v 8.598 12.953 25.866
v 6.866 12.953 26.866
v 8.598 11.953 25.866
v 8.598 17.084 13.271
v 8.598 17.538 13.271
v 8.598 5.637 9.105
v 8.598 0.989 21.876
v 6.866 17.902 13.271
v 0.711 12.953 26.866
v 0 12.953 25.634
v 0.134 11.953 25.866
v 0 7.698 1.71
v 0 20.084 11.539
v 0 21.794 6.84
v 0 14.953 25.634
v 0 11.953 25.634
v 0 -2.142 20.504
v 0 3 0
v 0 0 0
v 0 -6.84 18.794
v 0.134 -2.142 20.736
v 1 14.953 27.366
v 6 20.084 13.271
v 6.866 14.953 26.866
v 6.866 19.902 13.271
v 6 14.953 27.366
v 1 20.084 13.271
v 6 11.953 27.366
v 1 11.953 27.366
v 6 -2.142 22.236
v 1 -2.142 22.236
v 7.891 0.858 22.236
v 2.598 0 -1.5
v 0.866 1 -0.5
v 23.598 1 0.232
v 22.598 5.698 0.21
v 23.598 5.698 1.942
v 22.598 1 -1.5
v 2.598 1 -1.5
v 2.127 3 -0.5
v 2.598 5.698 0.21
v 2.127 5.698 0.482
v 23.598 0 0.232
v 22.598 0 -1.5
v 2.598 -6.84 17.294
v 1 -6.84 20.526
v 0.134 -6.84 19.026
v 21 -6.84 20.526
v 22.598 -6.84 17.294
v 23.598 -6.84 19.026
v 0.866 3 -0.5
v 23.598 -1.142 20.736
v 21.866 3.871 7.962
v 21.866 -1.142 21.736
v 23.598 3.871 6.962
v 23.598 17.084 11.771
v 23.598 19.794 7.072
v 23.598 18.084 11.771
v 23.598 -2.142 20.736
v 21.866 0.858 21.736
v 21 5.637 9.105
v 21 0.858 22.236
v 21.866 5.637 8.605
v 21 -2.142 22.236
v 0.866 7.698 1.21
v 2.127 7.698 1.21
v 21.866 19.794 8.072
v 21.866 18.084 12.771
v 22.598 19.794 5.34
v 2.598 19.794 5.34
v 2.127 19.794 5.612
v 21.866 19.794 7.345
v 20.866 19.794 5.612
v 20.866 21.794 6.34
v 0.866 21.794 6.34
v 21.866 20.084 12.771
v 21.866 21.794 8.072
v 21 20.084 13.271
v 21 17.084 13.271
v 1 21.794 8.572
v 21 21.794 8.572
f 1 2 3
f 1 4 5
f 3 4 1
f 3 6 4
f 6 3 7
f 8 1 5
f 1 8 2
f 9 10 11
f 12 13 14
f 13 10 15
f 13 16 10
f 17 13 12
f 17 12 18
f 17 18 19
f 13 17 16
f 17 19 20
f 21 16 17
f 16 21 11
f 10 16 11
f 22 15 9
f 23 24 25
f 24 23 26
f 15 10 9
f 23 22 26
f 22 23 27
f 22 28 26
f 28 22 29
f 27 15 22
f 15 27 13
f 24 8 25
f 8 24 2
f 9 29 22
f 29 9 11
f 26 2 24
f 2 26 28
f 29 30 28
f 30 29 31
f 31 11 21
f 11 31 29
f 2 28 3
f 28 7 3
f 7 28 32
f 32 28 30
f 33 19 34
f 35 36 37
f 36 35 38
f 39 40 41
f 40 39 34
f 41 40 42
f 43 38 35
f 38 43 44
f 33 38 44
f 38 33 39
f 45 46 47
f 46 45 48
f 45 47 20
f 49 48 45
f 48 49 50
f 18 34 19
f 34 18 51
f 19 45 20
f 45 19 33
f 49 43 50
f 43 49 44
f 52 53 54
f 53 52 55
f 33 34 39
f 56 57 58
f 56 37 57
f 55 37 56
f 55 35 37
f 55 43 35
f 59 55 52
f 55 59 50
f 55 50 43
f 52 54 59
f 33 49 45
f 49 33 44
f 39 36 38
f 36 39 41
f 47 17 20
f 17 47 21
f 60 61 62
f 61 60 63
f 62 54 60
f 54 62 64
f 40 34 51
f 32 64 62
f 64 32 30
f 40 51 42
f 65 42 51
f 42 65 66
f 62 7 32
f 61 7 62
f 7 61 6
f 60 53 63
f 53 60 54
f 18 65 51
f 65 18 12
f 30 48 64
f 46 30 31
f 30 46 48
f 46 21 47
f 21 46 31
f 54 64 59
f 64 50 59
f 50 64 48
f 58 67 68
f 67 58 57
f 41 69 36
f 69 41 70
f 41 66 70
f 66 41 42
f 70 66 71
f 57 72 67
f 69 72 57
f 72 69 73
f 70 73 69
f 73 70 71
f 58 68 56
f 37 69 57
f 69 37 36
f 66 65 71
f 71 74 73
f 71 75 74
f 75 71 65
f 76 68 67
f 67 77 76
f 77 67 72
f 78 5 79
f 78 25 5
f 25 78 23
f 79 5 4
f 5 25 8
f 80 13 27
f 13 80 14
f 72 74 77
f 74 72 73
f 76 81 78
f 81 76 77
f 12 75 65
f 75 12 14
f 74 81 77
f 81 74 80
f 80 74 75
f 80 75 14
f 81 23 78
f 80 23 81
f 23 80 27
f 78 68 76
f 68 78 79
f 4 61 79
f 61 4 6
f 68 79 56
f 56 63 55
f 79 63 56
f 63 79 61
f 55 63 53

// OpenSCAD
// case 09: two non-convex solids, neither a prism along a shared direction. Each is split into
// convex prisms along its own direction; every pair is one polytope hull. Exact (manifold's
// mesh sum over the same polyhedra lands on the same volume).
minkowski() { rotate([20, 0, 0]) difference() { cube(20); translate([5, 5, 5]) cube(20); } rotate([0, 30, 0]) linear_extrude(2) polygon([[0,0],[3,0],[3,1],[1,1],[1,3],[0,3]]); }
